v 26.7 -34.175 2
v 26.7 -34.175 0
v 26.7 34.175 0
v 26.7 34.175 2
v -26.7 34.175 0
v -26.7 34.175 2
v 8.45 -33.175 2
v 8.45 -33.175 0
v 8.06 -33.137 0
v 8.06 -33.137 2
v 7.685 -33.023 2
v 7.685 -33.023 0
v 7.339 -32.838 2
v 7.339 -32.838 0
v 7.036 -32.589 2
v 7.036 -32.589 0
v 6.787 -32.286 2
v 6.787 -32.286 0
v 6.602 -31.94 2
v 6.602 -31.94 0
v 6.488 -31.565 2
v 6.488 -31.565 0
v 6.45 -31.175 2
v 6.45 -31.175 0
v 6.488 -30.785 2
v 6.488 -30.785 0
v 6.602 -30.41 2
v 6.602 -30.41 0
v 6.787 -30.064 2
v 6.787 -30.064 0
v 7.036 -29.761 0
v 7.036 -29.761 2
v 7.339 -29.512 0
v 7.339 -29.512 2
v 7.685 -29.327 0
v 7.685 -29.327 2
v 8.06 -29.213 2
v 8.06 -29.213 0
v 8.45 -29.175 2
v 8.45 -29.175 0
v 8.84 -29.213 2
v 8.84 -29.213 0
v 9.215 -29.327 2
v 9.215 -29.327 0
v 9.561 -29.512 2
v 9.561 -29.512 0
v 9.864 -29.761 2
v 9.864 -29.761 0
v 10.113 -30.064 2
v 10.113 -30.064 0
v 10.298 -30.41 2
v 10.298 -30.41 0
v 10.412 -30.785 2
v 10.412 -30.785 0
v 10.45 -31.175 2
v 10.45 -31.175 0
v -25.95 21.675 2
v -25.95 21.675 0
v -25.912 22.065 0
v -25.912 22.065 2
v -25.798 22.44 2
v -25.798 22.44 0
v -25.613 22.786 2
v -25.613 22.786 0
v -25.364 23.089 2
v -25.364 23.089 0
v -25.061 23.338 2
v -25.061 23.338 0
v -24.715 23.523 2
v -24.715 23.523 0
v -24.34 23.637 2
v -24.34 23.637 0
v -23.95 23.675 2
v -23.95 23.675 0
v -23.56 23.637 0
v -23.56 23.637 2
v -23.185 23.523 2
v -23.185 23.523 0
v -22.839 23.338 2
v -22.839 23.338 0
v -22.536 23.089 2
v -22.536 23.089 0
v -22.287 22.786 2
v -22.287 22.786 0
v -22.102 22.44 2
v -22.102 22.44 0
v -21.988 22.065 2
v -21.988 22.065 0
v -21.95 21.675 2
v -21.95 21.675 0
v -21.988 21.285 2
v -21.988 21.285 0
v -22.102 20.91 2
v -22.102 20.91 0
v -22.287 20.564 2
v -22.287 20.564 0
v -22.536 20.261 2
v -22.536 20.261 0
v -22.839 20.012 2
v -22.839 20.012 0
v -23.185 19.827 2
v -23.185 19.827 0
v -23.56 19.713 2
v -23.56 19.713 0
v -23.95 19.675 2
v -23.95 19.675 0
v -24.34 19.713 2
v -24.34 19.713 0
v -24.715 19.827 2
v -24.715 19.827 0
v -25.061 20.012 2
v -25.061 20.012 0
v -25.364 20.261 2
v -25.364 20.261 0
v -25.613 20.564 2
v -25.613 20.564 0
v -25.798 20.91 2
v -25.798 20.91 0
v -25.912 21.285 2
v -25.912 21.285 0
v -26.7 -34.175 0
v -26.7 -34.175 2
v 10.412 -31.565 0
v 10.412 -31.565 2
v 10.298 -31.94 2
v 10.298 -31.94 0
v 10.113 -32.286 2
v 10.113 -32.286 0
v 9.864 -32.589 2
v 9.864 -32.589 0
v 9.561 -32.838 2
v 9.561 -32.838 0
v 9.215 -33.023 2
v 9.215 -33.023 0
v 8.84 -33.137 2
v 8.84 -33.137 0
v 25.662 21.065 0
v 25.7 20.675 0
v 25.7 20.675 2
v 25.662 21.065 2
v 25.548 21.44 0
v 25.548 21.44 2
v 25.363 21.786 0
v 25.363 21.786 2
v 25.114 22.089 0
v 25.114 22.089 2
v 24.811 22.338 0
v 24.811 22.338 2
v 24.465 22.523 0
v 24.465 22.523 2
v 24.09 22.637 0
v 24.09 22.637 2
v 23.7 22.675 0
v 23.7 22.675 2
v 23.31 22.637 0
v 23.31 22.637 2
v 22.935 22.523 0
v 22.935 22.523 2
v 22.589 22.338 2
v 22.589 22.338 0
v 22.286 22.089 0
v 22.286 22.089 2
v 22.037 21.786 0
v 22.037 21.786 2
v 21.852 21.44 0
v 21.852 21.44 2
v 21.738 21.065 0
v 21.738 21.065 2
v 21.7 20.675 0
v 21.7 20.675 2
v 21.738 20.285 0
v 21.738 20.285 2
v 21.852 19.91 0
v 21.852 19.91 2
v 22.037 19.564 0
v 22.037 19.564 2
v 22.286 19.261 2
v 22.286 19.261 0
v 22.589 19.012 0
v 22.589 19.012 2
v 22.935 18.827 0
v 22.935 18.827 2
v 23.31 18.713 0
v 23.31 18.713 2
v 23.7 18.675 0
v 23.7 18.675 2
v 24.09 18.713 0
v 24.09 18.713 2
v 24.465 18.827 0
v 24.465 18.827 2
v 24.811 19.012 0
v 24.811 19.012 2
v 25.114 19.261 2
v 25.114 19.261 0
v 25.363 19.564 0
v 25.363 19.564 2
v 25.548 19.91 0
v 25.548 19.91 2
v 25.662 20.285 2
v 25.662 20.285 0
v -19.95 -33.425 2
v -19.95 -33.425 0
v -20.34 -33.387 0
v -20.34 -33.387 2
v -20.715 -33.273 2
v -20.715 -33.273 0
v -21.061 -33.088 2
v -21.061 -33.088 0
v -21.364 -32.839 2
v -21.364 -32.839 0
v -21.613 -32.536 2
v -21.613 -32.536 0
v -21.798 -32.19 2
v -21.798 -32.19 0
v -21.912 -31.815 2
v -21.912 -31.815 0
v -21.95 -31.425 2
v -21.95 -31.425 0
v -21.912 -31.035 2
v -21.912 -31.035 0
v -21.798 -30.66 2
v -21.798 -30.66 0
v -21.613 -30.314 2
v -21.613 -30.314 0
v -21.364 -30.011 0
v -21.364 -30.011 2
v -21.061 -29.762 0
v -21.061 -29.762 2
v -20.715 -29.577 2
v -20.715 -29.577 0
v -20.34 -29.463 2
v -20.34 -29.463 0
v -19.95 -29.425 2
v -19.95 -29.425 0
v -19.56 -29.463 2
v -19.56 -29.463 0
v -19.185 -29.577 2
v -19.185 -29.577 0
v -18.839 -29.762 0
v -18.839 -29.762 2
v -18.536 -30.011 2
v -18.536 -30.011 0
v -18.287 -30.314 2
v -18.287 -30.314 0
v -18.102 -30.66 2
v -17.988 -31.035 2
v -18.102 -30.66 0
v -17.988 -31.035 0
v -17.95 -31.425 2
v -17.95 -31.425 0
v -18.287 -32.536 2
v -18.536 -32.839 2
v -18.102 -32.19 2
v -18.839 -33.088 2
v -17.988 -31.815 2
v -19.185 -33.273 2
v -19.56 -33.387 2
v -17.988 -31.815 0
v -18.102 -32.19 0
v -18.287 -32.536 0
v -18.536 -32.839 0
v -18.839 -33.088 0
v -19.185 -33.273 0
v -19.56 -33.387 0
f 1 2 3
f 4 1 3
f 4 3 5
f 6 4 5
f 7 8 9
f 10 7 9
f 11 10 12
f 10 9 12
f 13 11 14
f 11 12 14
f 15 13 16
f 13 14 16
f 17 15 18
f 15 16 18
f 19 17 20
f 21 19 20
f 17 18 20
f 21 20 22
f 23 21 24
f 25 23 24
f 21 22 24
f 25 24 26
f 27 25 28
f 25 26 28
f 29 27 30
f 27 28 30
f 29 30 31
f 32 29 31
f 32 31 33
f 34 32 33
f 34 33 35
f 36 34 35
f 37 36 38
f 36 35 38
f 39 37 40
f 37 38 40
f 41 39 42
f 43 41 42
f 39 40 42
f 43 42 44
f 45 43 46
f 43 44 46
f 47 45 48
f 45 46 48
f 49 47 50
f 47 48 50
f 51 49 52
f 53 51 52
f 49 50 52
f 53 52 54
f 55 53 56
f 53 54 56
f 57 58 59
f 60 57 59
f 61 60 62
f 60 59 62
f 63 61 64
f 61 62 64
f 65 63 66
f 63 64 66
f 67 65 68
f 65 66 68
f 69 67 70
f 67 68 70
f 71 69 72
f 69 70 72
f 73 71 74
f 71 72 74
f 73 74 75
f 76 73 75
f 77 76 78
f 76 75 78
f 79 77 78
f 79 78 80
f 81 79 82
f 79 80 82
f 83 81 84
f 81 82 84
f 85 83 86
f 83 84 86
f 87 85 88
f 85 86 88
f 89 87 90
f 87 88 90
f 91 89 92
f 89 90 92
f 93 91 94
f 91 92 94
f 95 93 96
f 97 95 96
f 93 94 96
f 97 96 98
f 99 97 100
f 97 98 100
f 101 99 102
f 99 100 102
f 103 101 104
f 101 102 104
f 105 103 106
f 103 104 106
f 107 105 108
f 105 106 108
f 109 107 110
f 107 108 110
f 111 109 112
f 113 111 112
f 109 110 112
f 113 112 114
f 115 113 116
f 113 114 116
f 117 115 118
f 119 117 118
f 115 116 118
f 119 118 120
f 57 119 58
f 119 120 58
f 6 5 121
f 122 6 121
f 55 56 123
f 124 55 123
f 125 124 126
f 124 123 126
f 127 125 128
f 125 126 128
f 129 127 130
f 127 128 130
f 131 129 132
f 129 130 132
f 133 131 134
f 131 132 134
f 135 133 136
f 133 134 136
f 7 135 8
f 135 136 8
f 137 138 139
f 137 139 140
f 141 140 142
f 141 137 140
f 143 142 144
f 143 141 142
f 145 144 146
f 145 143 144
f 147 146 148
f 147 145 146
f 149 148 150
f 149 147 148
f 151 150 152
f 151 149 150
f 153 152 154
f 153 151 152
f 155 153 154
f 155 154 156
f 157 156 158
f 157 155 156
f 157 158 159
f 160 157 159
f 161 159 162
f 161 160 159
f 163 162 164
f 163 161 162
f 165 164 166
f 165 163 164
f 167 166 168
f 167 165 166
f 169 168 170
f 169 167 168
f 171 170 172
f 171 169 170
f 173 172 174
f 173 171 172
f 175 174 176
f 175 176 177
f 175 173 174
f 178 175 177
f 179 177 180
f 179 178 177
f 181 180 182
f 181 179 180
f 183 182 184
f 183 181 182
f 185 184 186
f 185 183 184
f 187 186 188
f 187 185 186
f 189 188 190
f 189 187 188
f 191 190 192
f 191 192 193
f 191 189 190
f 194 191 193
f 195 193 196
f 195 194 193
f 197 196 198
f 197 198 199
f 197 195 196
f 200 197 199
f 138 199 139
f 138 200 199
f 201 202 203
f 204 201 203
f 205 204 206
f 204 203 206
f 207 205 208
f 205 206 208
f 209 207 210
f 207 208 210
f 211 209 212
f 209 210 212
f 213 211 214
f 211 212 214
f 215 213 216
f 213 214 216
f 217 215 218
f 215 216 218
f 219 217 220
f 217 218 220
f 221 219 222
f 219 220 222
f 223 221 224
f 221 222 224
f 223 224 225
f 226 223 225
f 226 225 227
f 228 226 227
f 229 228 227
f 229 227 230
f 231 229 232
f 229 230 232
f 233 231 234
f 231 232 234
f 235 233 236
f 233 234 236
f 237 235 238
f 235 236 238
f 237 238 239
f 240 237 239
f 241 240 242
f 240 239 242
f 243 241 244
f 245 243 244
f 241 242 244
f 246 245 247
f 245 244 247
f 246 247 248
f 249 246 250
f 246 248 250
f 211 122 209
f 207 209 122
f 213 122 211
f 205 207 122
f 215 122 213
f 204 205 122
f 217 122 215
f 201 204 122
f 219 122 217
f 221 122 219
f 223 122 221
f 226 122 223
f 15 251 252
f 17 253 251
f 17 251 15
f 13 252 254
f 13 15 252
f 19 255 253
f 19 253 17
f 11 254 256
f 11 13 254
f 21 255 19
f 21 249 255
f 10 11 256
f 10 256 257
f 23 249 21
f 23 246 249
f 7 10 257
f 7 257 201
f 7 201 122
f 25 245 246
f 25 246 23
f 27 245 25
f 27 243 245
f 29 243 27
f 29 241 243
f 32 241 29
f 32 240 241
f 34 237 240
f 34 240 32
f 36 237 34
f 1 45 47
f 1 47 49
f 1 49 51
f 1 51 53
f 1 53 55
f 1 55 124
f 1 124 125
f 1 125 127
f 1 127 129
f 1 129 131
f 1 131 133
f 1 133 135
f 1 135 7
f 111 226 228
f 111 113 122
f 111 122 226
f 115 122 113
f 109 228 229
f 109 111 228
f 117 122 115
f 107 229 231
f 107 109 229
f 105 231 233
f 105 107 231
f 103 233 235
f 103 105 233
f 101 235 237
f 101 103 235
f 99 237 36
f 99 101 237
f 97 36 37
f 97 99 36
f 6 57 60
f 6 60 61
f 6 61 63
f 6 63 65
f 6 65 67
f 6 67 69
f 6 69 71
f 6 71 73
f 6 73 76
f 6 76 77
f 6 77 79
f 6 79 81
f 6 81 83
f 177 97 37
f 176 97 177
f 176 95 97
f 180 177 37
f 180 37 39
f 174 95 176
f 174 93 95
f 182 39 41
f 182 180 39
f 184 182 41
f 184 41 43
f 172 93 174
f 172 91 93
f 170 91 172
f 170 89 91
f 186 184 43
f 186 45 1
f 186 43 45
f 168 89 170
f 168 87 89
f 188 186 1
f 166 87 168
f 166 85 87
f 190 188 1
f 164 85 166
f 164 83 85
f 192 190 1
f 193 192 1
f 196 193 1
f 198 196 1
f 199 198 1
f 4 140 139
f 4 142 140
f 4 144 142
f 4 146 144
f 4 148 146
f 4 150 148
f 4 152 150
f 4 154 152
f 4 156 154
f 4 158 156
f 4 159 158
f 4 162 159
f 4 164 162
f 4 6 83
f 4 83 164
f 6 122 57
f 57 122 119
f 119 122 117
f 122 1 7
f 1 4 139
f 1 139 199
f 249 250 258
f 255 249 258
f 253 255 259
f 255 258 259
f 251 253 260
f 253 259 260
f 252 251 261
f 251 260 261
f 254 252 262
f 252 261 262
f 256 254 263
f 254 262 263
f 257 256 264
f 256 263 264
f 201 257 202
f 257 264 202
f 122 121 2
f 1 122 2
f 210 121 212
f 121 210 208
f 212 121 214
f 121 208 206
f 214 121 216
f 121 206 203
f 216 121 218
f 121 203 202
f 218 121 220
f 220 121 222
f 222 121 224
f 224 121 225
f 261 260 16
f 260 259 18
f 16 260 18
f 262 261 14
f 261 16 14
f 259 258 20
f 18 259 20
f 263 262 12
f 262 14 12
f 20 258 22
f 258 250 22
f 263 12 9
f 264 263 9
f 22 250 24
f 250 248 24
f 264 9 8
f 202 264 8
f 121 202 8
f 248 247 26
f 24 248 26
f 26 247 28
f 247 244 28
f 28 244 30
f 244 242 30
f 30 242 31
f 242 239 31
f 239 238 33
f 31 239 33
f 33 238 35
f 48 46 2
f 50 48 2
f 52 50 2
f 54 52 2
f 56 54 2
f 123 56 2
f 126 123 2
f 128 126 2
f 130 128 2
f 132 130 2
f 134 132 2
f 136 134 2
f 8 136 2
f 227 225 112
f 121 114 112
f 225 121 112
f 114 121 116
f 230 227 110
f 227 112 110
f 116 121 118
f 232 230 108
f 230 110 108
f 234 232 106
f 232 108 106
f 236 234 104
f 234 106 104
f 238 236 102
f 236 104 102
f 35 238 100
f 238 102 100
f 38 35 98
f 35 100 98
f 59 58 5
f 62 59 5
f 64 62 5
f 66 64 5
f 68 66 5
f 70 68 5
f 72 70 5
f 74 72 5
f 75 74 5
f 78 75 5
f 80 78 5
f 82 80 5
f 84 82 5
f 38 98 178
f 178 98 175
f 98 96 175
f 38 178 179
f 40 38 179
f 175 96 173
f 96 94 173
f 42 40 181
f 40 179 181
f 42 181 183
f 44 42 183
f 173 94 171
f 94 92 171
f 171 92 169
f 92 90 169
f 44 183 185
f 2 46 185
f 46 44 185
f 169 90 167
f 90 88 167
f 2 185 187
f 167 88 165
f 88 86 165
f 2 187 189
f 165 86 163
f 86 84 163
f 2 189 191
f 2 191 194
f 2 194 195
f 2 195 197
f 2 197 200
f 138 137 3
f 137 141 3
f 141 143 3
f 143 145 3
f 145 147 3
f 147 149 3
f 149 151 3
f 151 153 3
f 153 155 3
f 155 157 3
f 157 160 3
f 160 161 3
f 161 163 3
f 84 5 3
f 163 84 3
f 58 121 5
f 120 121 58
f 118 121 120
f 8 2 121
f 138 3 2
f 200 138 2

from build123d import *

# Parameters (mm, degrees)
F0_R     = 2
F1_DEPTH = 2


with BuildPart() as f1:
    # F0 (on Top) → F1 (new body)
    with BuildSketch(Plane.XY):
        Polygon((26.7, 20.675), (26.7, 34.175), (-26.7, 34.175), (-26.7, 21.675), (-26.7, -34.175), (-19.95, -34.175), (8.45, -34.175), (26.7, -34.175), align=None)
        with BuildLine():
            ThreePointArc((-17.95, -31.425), (-18.535786, -32.839214), (-19.95, -33.425))
            ThreePointArc((-19.95, -33.425), (-21.364214, -30.010786), (-17.95, -31.425))
        make_face(mode=Mode.SUBTRACT)
        with BuildLine():
            ThreePointArc((10.45, -31.175), (9.864214, -32.589214), (8.45, -33.175))
            ThreePointArc((8.45, -33.175), (7.035786, -29.760786), (10.45, -31.175))
        make_face(mode=Mode.SUBTRACT)
        with BuildLine():
            ThreePointArc((-21.95, 21.675), (-23.95, 19.675), (-25.95, 21.675))
            ThreePointArc((-25.95, 21.675), (-23.95, 23.675), (-21.95, 21.675))
        make_face(mode=Mode.SUBTRACT)
        with Locations((23.7, 20.675)):
            Circle(F0_R, mode=Mode.SUBTRACT)
    extrude(amount=F1_DEPTH)


solid = f1.part
